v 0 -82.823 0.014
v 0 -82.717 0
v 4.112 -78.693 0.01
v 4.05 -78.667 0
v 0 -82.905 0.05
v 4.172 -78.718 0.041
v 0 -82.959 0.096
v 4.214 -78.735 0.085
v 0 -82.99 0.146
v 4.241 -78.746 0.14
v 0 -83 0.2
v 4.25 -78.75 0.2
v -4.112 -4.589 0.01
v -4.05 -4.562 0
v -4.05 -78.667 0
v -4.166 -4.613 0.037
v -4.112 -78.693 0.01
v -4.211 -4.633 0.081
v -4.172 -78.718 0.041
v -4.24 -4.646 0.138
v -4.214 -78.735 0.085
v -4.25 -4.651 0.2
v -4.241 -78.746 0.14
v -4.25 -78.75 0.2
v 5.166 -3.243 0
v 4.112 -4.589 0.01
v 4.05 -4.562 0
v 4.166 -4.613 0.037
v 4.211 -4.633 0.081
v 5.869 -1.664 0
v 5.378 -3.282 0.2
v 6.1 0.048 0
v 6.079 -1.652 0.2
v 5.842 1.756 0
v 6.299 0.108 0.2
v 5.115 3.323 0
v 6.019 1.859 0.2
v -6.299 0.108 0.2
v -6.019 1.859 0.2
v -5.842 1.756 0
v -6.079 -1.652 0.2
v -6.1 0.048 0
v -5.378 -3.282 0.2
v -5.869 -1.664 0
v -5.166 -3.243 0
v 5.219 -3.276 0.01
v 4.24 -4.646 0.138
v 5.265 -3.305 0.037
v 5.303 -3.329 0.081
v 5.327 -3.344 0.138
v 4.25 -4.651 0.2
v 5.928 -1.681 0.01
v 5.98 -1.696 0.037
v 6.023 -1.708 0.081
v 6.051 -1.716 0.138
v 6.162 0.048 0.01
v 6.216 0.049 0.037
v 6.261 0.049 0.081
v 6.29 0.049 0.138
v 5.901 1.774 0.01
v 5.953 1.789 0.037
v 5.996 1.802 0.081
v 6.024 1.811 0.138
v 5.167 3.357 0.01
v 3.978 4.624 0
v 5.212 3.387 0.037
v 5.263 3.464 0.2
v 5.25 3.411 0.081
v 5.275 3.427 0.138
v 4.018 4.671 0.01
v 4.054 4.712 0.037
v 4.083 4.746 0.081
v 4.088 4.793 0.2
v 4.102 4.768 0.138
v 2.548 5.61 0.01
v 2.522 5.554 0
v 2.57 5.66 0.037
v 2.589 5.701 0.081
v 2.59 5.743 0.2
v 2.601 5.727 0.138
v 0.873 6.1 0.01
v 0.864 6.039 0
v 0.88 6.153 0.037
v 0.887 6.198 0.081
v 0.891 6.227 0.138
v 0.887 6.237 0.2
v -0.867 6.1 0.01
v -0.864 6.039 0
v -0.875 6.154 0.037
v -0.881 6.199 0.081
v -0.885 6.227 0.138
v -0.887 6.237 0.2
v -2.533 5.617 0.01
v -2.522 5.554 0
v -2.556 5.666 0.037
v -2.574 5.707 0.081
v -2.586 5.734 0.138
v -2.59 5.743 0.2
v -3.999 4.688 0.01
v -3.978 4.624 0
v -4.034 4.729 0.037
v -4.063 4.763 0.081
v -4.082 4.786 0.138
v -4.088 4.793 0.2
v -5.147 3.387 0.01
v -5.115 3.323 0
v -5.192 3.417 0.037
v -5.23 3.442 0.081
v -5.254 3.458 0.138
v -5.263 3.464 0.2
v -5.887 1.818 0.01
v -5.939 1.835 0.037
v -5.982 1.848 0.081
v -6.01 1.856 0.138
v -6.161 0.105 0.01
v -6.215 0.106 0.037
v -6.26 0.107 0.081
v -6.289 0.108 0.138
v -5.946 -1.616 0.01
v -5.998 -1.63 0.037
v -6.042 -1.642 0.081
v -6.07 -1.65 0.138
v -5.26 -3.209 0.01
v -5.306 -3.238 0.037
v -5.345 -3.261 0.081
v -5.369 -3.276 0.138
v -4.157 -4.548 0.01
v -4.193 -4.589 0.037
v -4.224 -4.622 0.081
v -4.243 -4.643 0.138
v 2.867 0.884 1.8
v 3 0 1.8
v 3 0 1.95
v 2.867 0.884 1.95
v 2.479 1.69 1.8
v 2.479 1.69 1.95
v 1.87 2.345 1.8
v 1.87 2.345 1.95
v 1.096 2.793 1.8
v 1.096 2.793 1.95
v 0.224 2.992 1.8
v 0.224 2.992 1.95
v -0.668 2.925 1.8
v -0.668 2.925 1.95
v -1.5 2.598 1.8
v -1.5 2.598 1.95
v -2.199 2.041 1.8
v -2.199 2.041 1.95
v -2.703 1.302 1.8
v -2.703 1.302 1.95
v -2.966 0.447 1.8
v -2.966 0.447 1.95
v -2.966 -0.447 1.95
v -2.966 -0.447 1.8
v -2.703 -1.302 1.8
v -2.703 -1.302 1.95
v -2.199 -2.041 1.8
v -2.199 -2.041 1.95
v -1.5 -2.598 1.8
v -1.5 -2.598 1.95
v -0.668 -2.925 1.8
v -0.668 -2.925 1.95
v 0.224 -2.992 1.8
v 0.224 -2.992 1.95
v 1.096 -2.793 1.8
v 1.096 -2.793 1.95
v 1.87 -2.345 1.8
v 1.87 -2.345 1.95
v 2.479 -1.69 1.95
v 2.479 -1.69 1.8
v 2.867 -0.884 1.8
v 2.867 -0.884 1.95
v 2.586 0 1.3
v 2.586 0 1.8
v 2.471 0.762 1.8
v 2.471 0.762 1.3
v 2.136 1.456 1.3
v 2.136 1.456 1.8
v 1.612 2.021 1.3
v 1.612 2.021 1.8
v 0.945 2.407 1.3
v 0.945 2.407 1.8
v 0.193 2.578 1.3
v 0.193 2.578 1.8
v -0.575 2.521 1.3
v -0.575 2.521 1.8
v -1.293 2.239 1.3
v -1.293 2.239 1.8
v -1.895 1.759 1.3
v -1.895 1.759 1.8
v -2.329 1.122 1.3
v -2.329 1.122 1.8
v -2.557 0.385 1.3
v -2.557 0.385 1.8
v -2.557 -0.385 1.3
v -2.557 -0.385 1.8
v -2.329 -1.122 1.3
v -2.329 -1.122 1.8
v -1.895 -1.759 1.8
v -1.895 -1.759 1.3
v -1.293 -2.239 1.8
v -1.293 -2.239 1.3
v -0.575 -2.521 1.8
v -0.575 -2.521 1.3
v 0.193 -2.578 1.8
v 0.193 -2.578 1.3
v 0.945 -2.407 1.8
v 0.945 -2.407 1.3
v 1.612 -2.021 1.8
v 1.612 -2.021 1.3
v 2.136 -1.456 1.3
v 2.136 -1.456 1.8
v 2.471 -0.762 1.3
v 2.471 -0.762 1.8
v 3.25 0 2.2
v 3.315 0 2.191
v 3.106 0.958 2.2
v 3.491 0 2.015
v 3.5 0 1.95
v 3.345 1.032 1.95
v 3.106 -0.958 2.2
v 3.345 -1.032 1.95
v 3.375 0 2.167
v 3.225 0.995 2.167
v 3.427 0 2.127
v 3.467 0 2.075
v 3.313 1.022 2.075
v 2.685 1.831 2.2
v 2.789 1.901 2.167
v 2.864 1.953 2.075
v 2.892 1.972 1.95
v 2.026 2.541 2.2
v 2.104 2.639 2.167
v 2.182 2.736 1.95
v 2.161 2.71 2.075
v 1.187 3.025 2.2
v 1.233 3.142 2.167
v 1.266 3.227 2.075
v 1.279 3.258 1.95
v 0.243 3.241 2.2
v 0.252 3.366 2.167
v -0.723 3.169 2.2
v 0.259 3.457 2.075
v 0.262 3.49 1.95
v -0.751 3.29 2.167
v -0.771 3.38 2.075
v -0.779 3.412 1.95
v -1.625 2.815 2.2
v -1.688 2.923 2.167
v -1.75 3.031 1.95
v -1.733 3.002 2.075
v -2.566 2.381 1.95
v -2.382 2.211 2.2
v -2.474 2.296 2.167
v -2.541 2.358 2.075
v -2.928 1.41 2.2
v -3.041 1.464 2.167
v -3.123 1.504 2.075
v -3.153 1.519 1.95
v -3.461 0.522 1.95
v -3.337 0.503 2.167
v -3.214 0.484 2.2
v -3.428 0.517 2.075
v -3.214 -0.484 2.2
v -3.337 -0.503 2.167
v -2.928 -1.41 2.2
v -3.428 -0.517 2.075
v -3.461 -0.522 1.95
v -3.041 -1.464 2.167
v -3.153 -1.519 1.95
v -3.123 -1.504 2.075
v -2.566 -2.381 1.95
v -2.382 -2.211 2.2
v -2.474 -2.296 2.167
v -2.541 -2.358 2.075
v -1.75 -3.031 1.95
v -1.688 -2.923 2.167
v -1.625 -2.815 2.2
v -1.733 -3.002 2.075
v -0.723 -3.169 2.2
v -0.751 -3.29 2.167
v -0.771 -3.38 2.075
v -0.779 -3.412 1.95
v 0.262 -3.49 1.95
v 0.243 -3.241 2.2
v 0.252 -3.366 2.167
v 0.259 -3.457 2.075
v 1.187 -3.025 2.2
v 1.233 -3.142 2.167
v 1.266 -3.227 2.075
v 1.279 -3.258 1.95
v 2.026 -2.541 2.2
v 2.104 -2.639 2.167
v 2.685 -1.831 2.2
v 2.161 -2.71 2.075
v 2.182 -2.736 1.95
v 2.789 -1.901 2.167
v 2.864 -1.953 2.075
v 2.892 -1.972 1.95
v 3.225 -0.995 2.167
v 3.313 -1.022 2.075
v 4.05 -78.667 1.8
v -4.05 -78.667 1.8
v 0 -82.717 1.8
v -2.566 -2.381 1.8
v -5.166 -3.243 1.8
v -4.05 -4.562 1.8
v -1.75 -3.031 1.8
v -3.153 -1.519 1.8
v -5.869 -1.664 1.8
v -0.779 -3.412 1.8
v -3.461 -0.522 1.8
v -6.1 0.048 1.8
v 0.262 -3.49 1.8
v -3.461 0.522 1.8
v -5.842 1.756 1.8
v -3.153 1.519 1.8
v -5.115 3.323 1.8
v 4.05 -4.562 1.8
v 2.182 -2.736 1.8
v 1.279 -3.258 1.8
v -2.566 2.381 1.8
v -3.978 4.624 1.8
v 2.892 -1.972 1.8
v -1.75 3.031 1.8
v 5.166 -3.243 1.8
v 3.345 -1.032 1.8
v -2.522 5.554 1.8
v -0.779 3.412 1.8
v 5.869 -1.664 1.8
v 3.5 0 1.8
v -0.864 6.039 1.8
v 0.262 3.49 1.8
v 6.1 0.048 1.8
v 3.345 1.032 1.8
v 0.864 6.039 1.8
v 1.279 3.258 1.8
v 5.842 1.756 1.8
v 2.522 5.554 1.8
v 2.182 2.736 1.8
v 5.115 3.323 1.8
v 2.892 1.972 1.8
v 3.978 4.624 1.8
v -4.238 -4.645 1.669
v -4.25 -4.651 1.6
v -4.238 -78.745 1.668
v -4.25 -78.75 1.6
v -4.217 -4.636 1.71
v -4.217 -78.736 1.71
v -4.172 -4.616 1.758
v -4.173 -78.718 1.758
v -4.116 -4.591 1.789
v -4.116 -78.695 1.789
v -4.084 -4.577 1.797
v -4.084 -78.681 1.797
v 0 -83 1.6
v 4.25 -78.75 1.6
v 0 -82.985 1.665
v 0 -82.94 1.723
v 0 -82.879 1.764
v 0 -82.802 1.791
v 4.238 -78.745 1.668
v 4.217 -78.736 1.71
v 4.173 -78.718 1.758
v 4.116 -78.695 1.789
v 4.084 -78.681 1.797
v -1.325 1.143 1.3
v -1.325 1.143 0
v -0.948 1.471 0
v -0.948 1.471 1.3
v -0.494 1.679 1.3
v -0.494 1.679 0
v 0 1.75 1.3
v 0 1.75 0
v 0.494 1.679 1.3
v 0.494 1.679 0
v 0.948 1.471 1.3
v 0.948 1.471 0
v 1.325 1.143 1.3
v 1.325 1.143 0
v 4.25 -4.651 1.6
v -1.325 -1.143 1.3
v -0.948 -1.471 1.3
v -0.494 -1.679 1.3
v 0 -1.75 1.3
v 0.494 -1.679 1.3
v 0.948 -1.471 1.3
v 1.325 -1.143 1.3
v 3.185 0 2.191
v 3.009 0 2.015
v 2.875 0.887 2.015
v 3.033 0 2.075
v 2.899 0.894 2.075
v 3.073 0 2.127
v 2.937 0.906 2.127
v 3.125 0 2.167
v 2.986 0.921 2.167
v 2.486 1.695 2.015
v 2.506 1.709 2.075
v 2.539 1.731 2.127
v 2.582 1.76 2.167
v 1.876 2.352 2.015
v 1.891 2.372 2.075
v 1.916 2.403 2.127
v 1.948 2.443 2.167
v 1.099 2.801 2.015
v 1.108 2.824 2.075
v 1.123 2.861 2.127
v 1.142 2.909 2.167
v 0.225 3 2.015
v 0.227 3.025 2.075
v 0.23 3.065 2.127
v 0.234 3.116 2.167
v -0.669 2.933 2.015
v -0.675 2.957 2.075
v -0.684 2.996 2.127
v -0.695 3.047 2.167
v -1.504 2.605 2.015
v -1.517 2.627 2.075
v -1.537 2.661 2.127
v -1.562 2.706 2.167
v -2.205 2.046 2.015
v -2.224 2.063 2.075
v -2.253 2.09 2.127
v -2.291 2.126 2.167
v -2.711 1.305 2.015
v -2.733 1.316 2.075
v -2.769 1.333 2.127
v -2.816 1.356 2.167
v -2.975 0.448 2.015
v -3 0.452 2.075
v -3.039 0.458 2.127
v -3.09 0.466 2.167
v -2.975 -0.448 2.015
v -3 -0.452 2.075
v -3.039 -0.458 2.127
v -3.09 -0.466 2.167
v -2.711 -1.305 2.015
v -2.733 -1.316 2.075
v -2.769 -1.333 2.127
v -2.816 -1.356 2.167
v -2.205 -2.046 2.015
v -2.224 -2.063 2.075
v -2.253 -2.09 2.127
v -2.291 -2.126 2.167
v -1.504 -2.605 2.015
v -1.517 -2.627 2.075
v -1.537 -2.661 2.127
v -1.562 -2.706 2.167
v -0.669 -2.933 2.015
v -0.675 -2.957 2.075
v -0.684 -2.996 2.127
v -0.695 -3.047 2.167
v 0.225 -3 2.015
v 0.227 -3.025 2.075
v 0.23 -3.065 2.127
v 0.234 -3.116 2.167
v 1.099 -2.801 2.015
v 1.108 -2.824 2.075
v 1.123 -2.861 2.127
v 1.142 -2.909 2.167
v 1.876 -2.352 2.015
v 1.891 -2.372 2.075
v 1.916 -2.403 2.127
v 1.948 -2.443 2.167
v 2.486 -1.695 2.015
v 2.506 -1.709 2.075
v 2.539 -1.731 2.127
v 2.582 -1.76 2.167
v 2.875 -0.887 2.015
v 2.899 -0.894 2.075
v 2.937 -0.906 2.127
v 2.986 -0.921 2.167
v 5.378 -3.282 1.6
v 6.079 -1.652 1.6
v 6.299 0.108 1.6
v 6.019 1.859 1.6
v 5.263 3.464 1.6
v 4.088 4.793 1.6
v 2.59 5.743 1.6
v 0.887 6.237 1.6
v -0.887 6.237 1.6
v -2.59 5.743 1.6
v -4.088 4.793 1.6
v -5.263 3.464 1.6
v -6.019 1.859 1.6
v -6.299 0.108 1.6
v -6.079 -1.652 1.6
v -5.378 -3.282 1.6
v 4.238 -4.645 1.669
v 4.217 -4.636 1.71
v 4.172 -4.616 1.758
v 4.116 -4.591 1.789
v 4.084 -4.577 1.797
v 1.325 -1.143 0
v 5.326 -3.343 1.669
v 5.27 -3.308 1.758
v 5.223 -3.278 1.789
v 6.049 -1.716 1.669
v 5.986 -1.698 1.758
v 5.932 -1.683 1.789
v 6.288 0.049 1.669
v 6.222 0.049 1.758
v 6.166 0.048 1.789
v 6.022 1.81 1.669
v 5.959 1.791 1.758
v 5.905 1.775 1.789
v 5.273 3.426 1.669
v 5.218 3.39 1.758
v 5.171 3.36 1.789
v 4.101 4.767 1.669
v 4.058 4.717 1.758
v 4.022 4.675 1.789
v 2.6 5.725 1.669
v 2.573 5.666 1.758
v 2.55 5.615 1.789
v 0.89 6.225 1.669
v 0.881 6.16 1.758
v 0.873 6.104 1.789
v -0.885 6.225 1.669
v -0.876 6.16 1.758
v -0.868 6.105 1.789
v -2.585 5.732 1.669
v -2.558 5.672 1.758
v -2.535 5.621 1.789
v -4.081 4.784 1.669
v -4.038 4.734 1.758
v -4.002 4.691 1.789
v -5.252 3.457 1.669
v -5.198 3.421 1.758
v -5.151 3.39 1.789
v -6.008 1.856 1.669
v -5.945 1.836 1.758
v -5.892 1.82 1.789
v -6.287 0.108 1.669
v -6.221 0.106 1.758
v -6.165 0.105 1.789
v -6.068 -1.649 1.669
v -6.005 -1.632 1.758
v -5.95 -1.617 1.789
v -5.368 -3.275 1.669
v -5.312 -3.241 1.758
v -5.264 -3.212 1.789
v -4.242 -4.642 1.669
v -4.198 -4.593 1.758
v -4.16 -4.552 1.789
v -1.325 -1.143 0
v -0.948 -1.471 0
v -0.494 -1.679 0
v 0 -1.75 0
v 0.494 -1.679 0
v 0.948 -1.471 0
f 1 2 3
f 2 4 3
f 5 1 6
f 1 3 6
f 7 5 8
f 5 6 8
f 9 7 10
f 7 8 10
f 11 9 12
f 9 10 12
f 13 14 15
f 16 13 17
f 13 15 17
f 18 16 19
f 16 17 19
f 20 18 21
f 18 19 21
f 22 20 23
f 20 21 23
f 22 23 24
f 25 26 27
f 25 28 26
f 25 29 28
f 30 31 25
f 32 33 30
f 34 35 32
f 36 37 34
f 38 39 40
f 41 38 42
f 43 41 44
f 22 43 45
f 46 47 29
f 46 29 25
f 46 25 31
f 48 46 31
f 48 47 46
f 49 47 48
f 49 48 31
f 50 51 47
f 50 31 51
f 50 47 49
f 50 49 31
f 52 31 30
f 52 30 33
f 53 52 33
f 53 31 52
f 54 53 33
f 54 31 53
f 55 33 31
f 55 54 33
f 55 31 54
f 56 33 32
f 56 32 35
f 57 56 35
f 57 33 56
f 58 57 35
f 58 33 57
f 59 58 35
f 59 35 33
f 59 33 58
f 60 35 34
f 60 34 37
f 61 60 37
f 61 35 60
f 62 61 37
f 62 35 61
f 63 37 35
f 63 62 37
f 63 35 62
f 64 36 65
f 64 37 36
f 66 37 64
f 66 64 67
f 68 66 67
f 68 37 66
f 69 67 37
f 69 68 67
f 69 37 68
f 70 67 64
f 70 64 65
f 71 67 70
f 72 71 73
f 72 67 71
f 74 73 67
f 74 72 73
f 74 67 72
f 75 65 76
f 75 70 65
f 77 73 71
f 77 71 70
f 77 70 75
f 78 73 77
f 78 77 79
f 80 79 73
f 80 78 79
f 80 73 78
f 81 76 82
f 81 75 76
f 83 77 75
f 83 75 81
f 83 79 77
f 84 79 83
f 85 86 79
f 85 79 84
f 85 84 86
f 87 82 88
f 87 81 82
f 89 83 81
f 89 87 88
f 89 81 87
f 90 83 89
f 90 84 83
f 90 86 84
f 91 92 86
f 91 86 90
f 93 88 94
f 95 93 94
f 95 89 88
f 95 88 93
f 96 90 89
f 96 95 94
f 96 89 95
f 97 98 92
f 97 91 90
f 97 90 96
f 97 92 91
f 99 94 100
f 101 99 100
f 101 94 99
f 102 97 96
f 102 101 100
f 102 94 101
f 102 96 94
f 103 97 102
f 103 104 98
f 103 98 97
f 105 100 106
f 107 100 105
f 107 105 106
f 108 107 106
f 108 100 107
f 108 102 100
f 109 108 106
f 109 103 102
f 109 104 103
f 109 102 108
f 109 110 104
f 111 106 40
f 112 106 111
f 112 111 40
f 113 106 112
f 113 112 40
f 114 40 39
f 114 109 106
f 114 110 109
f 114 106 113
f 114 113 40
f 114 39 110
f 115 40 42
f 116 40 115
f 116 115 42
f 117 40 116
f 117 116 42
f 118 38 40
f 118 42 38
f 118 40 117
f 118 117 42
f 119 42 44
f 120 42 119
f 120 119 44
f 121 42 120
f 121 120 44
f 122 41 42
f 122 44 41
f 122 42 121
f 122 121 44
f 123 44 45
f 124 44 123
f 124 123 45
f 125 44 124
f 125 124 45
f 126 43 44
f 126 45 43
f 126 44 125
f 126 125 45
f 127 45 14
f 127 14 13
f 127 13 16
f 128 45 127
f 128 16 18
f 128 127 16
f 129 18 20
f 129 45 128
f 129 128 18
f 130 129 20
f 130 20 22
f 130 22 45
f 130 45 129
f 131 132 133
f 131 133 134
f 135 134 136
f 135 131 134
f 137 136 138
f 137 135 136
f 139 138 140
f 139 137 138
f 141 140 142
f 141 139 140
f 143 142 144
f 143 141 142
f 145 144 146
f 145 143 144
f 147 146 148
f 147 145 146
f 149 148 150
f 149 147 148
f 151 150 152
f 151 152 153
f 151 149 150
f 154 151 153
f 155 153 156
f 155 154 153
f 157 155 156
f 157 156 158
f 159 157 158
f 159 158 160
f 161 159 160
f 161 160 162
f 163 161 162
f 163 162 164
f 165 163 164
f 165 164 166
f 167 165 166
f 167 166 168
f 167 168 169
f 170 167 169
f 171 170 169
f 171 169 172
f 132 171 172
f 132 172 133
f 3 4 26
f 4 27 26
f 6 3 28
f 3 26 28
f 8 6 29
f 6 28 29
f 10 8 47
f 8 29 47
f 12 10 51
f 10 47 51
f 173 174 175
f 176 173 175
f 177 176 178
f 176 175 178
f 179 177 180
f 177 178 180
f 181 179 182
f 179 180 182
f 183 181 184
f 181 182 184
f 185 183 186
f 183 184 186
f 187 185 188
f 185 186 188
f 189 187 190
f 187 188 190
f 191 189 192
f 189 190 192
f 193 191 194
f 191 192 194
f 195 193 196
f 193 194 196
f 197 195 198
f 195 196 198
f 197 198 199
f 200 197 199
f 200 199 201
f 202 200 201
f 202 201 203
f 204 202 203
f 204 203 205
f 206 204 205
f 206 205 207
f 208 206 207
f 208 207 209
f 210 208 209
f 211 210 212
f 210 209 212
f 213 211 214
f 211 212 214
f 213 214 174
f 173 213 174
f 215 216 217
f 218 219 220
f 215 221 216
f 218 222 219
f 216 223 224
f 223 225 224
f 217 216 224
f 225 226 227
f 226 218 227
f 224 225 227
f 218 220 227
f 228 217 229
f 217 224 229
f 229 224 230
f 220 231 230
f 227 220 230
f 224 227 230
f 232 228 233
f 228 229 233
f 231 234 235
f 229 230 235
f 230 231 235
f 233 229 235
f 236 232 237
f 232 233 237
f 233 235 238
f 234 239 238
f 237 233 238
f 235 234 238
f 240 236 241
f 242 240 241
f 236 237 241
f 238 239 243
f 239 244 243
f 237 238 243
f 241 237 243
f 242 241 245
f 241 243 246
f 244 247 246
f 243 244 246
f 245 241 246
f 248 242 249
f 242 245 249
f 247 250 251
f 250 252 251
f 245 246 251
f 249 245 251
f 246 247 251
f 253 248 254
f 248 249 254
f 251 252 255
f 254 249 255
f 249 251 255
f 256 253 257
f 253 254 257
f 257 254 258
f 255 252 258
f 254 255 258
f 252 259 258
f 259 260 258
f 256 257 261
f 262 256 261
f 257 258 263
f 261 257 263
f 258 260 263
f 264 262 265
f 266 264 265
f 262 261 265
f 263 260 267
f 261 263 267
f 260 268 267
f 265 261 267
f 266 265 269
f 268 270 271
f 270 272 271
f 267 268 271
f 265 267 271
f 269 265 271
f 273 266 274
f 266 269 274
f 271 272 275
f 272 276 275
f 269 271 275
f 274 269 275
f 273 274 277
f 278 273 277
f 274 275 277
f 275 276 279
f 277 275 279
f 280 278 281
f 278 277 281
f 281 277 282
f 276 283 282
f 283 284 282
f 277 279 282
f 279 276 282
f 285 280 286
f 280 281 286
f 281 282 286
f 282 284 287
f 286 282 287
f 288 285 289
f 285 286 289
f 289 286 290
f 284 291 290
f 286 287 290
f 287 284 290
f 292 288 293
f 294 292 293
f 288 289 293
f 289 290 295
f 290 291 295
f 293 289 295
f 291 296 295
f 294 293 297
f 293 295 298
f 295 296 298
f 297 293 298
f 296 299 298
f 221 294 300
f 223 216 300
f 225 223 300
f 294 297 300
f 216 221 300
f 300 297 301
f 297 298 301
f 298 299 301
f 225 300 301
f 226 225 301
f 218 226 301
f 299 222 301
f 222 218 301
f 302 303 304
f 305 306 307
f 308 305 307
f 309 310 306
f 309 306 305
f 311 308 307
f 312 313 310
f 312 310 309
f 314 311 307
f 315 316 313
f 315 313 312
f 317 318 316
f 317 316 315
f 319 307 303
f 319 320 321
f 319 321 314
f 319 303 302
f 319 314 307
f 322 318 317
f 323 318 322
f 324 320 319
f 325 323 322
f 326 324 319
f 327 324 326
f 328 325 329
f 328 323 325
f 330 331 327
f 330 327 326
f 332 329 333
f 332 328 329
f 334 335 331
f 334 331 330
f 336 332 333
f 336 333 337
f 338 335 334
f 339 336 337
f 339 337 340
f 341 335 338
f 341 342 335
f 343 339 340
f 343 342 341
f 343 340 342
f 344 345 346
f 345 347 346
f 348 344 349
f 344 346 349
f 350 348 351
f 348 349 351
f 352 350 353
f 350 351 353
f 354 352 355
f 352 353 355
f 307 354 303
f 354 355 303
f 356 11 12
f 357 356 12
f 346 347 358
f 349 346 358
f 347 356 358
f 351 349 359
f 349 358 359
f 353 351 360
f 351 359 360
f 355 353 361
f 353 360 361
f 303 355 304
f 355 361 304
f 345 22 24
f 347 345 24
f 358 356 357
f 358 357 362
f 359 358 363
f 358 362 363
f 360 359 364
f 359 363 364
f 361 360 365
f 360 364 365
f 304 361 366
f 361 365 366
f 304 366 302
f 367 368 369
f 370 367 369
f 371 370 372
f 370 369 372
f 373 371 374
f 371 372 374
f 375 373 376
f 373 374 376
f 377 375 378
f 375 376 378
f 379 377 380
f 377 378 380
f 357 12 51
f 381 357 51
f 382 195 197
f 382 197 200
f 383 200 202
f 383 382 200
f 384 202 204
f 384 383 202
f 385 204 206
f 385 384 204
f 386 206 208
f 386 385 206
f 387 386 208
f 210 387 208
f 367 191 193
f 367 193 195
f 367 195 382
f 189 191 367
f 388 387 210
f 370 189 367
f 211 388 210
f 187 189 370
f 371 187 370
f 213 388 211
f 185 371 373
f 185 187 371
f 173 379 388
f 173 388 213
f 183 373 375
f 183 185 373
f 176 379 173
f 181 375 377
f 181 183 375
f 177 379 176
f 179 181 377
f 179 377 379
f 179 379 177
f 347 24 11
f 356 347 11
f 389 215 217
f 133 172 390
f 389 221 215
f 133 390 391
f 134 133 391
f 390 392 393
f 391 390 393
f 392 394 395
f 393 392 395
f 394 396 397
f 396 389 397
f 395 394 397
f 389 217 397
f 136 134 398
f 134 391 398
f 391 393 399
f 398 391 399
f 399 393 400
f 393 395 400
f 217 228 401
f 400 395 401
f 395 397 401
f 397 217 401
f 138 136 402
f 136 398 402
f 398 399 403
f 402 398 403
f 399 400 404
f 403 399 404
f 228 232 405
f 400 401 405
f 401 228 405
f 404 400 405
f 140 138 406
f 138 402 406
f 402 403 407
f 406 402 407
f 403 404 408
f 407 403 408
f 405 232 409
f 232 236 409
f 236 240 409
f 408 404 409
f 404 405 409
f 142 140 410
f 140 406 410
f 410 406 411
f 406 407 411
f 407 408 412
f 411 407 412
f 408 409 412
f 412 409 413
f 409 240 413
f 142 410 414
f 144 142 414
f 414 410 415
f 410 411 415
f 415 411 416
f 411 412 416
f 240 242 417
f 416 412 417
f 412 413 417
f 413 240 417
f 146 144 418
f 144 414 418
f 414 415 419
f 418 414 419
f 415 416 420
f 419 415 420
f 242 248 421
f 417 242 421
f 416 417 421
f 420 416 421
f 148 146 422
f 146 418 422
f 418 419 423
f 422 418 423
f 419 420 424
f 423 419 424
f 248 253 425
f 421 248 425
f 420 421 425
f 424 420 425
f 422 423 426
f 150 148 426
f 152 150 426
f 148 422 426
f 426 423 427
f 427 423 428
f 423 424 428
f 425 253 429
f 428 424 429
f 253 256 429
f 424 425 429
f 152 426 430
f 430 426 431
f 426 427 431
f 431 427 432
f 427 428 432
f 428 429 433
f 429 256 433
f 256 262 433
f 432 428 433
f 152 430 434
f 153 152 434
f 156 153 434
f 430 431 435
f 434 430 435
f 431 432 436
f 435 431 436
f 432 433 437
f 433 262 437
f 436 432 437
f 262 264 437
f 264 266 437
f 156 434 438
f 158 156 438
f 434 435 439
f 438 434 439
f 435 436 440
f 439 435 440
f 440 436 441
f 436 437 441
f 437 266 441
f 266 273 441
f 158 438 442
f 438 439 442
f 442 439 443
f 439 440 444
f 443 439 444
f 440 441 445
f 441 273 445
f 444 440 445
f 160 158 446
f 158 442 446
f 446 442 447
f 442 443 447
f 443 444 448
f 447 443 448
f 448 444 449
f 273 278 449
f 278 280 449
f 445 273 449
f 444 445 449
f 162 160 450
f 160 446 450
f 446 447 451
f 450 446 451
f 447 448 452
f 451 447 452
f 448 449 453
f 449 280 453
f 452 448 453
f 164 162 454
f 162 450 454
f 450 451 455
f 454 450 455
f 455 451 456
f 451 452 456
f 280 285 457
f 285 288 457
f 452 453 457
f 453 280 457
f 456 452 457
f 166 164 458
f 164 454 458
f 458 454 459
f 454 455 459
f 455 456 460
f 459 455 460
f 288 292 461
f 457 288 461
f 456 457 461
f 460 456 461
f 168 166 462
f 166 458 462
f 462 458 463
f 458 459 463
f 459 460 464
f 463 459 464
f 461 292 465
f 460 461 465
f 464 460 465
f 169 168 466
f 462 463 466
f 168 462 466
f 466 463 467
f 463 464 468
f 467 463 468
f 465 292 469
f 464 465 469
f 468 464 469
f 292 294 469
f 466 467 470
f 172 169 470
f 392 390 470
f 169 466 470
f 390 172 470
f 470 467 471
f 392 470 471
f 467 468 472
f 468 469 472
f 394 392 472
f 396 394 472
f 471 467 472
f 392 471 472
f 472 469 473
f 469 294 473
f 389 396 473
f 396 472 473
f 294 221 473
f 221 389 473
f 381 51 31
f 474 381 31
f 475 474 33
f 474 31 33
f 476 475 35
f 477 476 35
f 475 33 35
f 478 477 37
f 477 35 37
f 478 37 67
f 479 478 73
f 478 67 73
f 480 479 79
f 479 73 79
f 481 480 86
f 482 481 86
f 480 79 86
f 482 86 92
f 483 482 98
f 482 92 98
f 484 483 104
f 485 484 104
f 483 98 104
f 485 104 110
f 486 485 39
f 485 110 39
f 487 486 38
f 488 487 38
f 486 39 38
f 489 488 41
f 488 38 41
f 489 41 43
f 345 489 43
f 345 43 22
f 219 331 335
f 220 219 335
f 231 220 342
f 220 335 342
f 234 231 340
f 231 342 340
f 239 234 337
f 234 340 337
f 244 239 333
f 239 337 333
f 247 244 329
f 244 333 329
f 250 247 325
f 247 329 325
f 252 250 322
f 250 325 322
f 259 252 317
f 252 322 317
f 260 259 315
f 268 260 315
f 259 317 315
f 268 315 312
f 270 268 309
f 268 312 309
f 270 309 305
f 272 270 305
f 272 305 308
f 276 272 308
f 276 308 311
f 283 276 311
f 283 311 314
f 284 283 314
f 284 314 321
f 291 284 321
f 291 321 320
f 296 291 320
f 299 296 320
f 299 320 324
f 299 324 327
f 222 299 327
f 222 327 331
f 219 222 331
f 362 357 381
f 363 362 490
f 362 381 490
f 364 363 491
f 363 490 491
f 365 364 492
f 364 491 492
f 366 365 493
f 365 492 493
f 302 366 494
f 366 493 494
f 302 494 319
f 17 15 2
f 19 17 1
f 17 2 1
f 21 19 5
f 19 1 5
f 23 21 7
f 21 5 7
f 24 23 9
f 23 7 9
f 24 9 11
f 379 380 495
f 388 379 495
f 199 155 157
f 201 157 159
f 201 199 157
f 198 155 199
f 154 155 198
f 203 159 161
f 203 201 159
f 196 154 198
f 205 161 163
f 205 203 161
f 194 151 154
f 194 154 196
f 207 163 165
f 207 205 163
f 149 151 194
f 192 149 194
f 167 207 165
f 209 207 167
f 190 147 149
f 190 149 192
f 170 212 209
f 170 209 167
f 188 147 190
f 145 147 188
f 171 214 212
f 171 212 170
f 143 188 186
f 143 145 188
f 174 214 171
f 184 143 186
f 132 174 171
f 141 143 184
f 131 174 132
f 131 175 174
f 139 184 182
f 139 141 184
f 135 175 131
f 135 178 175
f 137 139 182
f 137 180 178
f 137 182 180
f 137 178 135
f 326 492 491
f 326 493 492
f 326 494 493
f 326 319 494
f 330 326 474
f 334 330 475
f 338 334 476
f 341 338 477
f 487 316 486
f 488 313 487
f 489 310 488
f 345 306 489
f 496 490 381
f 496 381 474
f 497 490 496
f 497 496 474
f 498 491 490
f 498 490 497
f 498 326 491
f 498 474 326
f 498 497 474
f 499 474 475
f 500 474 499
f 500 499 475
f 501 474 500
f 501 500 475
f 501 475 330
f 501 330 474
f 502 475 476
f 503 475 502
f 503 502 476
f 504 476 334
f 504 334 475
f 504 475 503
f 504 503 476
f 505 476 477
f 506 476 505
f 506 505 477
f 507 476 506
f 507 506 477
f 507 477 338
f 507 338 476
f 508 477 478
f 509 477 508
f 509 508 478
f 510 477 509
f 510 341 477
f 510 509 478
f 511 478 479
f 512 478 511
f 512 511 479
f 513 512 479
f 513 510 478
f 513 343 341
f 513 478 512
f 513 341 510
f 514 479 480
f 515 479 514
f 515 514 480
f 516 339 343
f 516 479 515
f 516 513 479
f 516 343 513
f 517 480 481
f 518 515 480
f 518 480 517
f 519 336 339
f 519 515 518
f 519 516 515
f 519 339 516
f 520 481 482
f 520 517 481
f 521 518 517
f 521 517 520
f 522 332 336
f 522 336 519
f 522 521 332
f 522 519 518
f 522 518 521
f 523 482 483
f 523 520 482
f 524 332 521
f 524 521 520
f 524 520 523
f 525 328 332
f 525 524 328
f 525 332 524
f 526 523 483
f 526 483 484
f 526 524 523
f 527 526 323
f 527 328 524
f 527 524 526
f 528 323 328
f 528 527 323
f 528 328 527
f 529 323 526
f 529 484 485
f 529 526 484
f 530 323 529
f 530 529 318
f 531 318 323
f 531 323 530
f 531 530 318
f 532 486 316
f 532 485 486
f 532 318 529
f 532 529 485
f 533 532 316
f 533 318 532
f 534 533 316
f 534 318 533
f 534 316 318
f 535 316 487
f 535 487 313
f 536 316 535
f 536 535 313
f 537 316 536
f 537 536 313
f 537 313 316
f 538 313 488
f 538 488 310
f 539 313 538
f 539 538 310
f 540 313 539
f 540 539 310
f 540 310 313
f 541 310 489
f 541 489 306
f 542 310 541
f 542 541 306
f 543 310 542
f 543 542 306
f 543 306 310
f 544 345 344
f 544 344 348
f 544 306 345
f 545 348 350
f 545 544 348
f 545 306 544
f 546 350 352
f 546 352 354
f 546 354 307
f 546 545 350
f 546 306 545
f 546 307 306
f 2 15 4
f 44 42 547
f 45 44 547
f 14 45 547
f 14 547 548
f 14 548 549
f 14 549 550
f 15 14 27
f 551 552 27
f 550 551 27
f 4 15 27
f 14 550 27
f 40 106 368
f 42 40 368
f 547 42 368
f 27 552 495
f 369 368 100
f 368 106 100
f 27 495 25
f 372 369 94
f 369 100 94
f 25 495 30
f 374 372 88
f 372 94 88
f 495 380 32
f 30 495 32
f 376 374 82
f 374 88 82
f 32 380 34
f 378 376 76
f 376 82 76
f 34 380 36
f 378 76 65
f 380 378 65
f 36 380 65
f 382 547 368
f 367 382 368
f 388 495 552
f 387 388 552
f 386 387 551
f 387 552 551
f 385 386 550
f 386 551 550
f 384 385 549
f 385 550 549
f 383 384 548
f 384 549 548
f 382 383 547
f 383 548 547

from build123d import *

# Parameters (mm, degrees)
F0_R     = 3.5
F0_R_2   = 3
F1_DEPTH = 1.8
F2_DEPTH = 2.2
F3_R     = 0.2
F4_R     = 0.24999
F5_R     = 2.5855494015
F6_DEPTH = 0.5


# Not quite as in the source:
# - a fillet or chamfer is up to 0.001 mm smaller than in the source, because OpenCascade refuses the exact size


with BuildPart() as f1:
    # F0 (on Top) → F1 (new body)
    with BuildSketch(Plane.XY):
        with BuildLine():
            Line((4.25, -78.75), (4.25, -4.6505376033))
            ThreePointArc((4.25, -4.6505376033), (0, 6.3), (-4.25, -4.6505376033))
            Line((-4.25, -4.6505376033), (-4.25, -78.75))
            Line((-4.25, -78.75), (0, -83))
            Line((0, -83), (4.25, -78.75))
        make_face()
        Circle(F0_R, mode=Mode.SUBTRACT)
        Circle(F0_R)
        Circle(F0_R_2, mode=Mode.SUBTRACT)
        Circle(F0_R_2)
        with BuildLine():
            ThreePointArc((1.325, -1.1431863365), (0, -1.75), (-1.325, -1.1431863365))
            Line((-1.325, -1.1431863365), (-1.325, 1.1431863365))
            ThreePointArc((-1.325, 1.1431863365), (0, 1.75), (1.325, 1.1431863365))
            Line((1.325, 1.1431863365), (1.325, -1.1431863365))
        make_face(mode=Mode.SUBTRACT)
    extrude(amount=F1_DEPTH)

    # F0 (on Top) → F2 (join)
    with BuildSketch(Plane.XY):
        Circle(F0_R)
        Circle(F0_R_2, mode=Mode.SUBTRACT)
    extrude(amount=F2_DEPTH)

    # F3
    f3_edges = [f1.edges().sort_by_distance(p)[0] for p in [
        (-4.25, -41.700269, 1.8),
        (0, 6.3, 1.8),
        (4.25, -41.700269, 1.8),
        (2.125, -80.875, 1.8),
        (-2.125, -80.875, 1.8),
        (0, 6.3, 0),
        (4.25, -41.700269, 0),
        (-4.25, -41.700269, 0),
        (-2.125, -80.875, 0),
        (2.125, -80.875, 0),
    ]]
    fillet(f3_edges, radius=F3_R)

    # F4 (radius 0.25 in the source; OpenCascade refuses exactly that, so slightly less here)
    f4_edges = [f1.edges().sort_by_distance(p)[0] for p in [
        (-3.5, 0, 2.2),
        (-3, 0, 2.2),
    ]]
    fillet(f4_edges, radius=F4_R)

    # F5 (on face) → F6 (cut)
    with BuildSketch(Plane.XY.offset(1.8)):
        Circle(F5_R)
    extrude(amount=-F6_DEPTH, mode=Mode.SUBTRACT)


solid = f1.part
